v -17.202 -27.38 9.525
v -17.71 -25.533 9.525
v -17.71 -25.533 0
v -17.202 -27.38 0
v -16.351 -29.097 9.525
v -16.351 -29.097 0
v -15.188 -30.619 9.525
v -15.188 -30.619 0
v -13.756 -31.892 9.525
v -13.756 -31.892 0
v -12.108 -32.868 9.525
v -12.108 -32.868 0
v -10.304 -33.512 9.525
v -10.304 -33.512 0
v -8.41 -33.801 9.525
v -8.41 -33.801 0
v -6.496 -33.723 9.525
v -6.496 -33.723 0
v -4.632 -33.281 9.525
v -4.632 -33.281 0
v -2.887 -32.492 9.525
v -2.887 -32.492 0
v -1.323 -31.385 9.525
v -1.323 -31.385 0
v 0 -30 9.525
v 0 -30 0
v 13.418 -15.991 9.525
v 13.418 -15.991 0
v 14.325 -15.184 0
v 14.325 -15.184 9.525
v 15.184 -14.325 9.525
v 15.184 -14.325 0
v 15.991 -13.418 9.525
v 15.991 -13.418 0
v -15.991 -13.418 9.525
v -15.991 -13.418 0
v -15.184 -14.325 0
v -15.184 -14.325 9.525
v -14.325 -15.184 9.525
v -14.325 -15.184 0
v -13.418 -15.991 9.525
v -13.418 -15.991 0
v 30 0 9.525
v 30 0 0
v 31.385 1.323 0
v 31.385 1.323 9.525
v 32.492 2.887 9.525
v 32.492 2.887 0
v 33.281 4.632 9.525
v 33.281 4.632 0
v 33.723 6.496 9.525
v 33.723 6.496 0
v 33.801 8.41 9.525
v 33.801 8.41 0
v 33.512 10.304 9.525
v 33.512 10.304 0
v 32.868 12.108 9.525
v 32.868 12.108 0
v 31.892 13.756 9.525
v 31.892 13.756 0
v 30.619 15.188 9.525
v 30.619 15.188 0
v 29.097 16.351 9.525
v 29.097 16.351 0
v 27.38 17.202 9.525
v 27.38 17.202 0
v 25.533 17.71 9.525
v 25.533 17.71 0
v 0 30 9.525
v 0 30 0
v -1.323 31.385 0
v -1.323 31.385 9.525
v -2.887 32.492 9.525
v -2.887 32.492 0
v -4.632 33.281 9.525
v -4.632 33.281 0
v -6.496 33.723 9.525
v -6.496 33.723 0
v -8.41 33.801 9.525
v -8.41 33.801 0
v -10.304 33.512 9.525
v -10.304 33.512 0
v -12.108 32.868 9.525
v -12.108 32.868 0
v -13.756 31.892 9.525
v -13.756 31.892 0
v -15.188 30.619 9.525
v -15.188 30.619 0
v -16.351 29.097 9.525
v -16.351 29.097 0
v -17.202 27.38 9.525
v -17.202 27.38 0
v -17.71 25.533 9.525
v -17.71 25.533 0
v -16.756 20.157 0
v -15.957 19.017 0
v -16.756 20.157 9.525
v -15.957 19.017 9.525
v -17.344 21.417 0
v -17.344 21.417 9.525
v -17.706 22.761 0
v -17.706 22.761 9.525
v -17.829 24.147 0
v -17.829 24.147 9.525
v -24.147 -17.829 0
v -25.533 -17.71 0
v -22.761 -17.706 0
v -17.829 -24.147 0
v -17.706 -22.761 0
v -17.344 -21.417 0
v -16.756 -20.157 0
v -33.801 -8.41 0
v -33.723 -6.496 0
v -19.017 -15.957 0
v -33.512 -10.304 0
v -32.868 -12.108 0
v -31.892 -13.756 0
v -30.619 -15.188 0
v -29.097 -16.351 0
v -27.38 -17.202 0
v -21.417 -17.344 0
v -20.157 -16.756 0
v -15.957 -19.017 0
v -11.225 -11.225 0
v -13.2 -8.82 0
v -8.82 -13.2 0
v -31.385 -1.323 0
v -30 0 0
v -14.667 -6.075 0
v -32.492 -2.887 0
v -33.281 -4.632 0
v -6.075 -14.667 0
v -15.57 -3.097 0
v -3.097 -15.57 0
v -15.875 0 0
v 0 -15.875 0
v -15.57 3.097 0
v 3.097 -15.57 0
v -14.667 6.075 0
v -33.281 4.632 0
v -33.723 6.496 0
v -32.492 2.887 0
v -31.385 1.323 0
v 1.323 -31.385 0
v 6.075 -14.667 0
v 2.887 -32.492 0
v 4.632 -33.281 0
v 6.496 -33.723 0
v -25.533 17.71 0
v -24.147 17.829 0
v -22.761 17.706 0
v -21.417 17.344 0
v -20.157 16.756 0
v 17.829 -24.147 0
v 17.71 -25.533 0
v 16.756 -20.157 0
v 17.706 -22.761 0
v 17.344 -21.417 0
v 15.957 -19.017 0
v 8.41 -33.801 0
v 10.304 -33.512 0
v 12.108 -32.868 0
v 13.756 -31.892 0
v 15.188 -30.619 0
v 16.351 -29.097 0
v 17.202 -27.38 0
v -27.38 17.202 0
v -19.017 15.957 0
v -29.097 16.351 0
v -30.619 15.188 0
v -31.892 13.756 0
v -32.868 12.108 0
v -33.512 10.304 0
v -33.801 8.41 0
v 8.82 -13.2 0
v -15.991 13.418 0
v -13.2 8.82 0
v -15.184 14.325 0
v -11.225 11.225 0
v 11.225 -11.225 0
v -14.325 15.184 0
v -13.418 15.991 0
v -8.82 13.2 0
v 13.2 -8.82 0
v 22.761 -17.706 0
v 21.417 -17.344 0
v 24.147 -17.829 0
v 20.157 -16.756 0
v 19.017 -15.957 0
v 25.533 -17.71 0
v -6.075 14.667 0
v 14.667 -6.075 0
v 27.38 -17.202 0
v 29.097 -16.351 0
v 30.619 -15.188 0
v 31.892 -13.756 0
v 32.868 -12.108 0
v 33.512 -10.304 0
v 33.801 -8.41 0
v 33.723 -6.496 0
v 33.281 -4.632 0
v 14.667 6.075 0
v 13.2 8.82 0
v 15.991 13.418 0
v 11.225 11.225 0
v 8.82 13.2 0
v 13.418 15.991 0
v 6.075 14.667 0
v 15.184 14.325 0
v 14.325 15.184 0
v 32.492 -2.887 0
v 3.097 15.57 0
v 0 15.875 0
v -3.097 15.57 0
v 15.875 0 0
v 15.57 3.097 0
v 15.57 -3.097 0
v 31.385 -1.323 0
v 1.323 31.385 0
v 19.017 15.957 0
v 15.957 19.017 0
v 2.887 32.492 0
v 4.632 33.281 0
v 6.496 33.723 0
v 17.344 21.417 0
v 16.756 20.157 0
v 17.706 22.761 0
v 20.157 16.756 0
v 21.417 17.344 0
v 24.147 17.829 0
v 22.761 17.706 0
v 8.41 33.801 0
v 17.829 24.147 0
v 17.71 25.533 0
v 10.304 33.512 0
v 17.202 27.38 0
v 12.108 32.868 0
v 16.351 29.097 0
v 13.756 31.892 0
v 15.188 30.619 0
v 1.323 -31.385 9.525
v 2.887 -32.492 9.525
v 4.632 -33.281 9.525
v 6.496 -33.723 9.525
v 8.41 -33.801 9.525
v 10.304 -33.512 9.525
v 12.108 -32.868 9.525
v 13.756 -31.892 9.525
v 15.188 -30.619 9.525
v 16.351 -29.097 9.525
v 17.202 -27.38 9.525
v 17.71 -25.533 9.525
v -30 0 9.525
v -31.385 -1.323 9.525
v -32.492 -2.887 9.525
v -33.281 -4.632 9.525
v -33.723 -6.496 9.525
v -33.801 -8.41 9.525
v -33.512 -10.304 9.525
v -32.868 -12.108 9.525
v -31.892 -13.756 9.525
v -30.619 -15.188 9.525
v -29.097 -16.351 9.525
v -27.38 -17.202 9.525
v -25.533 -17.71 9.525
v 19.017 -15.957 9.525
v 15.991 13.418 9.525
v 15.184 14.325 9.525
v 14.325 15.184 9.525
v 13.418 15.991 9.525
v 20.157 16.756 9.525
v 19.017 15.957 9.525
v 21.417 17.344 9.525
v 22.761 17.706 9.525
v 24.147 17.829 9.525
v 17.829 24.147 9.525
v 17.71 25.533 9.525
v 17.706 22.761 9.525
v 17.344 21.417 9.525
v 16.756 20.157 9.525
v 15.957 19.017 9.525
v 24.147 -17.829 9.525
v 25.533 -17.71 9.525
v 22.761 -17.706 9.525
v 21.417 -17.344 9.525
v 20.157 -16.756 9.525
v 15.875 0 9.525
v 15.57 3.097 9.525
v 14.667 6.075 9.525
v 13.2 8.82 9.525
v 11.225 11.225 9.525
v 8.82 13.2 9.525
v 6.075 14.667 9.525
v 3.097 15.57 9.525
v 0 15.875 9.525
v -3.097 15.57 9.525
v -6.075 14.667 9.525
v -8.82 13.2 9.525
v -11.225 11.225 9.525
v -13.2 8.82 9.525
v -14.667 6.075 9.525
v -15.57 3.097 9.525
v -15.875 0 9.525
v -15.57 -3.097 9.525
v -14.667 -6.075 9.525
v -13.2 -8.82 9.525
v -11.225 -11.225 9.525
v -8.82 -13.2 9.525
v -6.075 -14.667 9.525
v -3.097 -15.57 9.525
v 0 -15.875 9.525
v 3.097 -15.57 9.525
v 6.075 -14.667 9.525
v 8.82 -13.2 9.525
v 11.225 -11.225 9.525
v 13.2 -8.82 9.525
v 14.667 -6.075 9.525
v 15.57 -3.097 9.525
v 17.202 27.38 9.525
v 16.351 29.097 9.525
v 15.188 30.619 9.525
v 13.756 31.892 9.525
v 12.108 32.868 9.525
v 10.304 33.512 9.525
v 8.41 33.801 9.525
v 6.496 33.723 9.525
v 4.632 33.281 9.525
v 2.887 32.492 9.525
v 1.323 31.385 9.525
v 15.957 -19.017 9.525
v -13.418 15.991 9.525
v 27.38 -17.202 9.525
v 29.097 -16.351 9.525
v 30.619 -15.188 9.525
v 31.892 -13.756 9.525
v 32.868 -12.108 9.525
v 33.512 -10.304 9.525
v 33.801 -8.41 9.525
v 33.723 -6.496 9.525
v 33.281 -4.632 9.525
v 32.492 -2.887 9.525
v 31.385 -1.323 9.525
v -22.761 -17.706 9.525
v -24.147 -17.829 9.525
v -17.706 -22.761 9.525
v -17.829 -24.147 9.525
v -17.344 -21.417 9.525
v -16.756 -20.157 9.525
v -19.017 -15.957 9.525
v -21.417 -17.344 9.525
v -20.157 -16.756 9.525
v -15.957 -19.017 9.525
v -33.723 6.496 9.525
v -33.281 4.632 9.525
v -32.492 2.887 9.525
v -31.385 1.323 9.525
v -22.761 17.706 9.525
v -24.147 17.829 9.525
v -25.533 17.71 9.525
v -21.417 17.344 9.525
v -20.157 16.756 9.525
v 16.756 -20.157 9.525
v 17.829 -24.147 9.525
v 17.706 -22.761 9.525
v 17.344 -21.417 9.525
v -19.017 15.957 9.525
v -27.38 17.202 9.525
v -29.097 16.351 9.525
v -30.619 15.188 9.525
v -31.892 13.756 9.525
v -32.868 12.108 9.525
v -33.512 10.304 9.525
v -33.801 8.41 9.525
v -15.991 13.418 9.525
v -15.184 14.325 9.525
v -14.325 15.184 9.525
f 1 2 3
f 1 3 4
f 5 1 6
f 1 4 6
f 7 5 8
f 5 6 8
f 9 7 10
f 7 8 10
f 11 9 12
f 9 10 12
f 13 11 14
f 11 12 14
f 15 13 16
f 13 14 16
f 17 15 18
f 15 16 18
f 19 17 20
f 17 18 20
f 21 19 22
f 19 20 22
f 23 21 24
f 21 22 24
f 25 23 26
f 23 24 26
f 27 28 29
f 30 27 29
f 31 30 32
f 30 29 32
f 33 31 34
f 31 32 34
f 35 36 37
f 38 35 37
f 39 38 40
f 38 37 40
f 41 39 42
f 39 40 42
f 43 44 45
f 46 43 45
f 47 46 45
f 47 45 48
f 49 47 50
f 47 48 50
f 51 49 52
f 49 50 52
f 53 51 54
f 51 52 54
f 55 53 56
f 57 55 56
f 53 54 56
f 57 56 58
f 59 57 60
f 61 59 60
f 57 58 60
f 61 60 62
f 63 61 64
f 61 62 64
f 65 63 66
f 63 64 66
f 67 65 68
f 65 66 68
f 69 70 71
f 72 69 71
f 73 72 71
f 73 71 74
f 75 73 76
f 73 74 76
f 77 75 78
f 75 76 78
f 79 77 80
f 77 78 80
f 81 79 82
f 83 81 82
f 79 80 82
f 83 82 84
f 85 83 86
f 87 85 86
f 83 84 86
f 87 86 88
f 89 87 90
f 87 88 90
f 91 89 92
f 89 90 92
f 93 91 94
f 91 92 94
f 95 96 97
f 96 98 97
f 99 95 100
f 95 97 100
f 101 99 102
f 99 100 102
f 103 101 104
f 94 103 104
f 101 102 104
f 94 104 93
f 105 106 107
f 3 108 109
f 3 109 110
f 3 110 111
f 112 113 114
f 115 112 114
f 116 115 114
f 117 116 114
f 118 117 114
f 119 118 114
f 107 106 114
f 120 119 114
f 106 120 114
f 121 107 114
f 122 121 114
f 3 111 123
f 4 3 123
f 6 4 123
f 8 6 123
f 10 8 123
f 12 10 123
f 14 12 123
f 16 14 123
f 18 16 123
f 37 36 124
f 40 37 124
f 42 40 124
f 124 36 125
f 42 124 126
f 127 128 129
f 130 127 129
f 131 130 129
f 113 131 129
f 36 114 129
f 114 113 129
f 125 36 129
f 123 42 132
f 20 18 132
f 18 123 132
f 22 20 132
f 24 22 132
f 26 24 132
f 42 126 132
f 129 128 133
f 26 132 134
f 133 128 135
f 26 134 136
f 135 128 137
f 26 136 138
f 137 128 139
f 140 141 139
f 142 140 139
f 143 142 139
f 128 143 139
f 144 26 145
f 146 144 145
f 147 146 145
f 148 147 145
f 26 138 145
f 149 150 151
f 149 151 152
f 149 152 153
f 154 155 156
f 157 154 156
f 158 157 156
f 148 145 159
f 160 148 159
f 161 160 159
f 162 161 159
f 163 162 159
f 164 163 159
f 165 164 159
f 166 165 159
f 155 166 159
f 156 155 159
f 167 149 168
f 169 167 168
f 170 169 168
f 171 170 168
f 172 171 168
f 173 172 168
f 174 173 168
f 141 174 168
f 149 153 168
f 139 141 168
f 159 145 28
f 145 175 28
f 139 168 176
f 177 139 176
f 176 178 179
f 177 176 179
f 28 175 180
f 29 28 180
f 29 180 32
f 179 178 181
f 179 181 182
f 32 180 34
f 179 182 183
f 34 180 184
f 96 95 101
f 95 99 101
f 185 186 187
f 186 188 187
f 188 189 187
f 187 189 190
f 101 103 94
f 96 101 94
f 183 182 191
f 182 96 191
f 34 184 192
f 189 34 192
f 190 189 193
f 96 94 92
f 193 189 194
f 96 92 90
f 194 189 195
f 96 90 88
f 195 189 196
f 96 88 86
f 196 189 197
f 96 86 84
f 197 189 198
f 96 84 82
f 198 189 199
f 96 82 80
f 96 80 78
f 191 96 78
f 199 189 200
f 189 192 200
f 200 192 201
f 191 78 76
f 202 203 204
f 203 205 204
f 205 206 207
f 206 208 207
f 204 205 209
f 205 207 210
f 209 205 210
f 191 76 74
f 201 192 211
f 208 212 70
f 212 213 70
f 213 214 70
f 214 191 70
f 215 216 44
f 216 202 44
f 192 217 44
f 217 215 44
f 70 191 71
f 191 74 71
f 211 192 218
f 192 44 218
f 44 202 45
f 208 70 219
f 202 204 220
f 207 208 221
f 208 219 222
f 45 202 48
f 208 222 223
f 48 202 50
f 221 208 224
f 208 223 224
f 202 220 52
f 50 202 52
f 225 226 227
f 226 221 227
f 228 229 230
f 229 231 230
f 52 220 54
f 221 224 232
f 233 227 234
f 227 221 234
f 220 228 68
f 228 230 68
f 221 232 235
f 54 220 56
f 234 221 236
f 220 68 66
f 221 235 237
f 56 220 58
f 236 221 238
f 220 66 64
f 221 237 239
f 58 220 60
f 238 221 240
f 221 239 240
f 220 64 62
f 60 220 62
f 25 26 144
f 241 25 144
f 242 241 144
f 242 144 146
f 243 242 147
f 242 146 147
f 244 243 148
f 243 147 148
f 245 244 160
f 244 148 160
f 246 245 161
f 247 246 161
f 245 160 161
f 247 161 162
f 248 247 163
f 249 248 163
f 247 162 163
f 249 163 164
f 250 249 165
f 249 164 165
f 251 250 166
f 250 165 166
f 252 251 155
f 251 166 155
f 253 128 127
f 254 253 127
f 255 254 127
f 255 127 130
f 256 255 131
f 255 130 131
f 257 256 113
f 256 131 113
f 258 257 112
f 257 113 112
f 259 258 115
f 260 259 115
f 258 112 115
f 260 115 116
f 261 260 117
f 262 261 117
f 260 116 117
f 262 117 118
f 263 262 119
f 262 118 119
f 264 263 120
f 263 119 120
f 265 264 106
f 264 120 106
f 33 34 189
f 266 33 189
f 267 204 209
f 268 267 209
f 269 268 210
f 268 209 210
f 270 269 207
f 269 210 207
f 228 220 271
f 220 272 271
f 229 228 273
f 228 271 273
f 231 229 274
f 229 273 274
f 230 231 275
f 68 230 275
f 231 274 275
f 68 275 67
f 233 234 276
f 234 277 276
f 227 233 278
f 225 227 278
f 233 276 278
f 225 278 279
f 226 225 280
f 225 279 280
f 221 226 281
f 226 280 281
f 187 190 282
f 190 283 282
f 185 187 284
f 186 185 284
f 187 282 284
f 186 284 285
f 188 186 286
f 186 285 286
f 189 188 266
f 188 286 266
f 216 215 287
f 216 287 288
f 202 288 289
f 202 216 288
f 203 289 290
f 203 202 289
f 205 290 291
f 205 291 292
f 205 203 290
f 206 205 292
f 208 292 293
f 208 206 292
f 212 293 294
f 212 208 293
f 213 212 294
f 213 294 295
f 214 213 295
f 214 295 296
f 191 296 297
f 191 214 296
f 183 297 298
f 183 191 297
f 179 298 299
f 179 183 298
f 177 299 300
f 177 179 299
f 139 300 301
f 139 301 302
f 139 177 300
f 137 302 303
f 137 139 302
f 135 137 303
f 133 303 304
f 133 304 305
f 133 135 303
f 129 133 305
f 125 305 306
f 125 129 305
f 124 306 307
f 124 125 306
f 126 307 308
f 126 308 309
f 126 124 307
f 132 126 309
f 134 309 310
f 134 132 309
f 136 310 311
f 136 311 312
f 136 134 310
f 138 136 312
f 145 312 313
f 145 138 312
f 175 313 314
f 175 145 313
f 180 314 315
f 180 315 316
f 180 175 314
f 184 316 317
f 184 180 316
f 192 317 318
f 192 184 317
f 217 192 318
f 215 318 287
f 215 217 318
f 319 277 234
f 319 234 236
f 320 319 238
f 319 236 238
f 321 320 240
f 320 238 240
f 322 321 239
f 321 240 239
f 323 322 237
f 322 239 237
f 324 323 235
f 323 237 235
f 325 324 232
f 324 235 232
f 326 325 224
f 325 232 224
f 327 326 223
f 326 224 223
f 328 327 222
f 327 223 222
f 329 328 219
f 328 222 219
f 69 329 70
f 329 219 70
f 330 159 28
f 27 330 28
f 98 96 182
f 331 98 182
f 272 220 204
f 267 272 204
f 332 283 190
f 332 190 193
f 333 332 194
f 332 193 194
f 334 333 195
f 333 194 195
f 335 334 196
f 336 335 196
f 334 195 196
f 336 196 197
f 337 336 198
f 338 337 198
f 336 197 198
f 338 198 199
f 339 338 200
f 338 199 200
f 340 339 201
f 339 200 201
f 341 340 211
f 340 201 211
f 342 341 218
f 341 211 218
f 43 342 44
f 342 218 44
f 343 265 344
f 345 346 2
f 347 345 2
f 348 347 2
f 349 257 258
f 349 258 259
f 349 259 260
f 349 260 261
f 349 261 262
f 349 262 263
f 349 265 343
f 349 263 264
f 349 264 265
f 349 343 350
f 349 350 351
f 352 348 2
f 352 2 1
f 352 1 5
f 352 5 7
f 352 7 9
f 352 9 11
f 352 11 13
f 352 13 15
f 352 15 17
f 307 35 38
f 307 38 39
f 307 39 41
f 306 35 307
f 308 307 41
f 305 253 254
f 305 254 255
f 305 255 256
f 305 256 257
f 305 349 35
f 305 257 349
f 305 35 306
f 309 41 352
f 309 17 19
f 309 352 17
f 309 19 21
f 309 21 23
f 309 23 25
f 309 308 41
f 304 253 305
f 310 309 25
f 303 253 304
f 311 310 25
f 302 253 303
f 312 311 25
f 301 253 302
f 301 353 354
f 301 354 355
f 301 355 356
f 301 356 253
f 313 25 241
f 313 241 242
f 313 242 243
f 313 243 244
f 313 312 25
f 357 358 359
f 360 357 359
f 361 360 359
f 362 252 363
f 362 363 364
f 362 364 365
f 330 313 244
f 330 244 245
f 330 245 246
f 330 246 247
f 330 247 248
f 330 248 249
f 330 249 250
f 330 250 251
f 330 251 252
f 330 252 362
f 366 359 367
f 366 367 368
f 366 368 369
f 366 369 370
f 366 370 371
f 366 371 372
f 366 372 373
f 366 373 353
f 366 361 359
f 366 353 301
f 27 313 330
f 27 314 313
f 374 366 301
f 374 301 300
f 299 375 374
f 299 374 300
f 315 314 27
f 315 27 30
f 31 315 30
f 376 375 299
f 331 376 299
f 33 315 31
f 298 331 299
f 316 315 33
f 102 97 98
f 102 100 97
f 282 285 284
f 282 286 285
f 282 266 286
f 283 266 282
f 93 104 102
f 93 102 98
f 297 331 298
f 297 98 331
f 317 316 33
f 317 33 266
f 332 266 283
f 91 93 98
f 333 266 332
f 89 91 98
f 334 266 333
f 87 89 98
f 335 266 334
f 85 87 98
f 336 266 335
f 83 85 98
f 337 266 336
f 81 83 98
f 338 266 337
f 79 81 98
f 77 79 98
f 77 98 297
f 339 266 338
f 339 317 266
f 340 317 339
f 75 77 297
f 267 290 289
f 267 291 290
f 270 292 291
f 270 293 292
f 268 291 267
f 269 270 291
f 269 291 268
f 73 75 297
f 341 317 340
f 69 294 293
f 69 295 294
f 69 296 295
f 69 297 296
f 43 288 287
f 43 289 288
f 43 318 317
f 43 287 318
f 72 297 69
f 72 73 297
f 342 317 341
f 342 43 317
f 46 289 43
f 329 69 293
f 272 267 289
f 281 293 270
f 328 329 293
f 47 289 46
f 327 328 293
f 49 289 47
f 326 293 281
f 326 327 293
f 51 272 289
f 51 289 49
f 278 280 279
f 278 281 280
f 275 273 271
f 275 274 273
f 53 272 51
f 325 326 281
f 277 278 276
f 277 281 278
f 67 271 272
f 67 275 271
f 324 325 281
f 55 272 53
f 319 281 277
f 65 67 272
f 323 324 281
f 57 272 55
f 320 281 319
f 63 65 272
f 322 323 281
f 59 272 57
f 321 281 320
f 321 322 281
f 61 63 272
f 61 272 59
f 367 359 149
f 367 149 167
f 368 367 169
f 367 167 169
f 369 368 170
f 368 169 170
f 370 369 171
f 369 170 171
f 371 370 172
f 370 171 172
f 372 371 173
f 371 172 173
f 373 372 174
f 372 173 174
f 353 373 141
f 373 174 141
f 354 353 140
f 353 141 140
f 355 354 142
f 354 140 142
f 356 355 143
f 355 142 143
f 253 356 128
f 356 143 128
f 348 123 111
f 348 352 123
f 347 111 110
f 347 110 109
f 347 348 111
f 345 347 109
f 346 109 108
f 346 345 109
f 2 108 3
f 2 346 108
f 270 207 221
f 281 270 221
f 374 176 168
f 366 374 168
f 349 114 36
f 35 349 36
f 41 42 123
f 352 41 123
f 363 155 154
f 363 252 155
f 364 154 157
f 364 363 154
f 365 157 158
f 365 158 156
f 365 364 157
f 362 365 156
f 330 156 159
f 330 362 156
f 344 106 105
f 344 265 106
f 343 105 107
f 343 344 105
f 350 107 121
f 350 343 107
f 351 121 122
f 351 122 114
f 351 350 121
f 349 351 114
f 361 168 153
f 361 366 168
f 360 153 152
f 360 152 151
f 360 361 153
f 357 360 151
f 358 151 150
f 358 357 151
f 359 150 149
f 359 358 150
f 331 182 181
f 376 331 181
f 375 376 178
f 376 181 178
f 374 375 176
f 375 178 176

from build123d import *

# Parameters (mm, degrees)
F0_R     = 15.875
F1_DEPTH = 9.525
F2_R     = 8


with BuildPart() as f1:
    # F0 (on Top) → F1 (new body)
    with BuildSketch(Plane.XY):
        with BuildLine():
            ThreePointArc((-15.991178, -13.418191), (-20.875, 0), (-15.991178, 13.418191))
            Line((-15.991178, 13.418191), (-20.6832, 17.355265))
            ThreePointArc((-20.6832, 17.355265), (-32.626759, 12.588513), (-30, 0))
            ThreePointArc((-30, 0), (-32.626759, -12.588513), (-20.6832, -17.355265))
            Line((-20.6832, -17.355265), (-15.991178, -13.418191))
        make_face()
        with BuildLine():
            Line((-17.355265, 20.6832), (-13.418191, 15.991178))
            ThreePointArc((-13.418191, 15.991178), (-14.760854, 14.760854), (-15.991178, 13.418191))
            ThreePointArc((-15.991178, 13.418191), (-20.875, 0), (-15.991178, -13.418191))
            ThreePointArc((-15.991178, -13.418191), (-14.760854, -14.760854), (-13.418191, -15.991178))
            Line((-13.418191, -15.991178), (-17.355265, -20.6832))
            ThreePointArc((-17.355265, -20.6832), (-12.588513, -32.626759), (0, -30))
            ThreePointArc((0, -30), (12.588513, -32.626759), (17.355265, -20.6832))
            Line((17.355265, -20.6832), (13.418191, -15.991178))
            ThreePointArc((13.418191, -15.991178), (14.760854, -14.760854), (15.991178, -13.418191))
            Line((15.991178, -13.418191), (20.6832, -17.355265))
            ThreePointArc((20.6832, -17.355265), (32.626759, -12.588513), (30, 0))
            ThreePointArc((30, 0), (32.626759, 12.588513), (20.6832, 17.355265))
            Line((20.6832, 17.355265), (15.991178, 13.418191))
            ThreePointArc((15.991178, 13.418191), (14.760854, 14.760854), (13.418191, 15.991178))
            Line((13.418191, 15.991178), (17.355265, 20.6832))
            ThreePointArc((17.355265, 20.6832), (12.588513, 32.626759), (0, 30))
            ThreePointArc((0, 30), (-12.588513, 32.626759), (-17.355265, 20.6832))
        make_face()
        Circle(F0_R, mode=Mode.SUBTRACT)
    extrude(amount=F1_DEPTH)

    # F2
    f2_edges = [f1.edges().sort_by_distance(p)[0] for p in [
        (-20.6832, -17.355265, 4.7625),
        (20.6832, -17.355265, 4.7625),
        (17.355265, 20.6832, 4.7625),
        (20.6832, 17.355265, 4.7625),
        (-17.355265, -20.6832, 4.7625),
        (-20.6832, 17.355265, 4.7625),
        (-17.355265, 20.6832, 4.7625),
        (17.355265, -20.6832, 4.7625),
    ]]
    fillet(f2_edges, radius=F2_R)


solid = f1.part
